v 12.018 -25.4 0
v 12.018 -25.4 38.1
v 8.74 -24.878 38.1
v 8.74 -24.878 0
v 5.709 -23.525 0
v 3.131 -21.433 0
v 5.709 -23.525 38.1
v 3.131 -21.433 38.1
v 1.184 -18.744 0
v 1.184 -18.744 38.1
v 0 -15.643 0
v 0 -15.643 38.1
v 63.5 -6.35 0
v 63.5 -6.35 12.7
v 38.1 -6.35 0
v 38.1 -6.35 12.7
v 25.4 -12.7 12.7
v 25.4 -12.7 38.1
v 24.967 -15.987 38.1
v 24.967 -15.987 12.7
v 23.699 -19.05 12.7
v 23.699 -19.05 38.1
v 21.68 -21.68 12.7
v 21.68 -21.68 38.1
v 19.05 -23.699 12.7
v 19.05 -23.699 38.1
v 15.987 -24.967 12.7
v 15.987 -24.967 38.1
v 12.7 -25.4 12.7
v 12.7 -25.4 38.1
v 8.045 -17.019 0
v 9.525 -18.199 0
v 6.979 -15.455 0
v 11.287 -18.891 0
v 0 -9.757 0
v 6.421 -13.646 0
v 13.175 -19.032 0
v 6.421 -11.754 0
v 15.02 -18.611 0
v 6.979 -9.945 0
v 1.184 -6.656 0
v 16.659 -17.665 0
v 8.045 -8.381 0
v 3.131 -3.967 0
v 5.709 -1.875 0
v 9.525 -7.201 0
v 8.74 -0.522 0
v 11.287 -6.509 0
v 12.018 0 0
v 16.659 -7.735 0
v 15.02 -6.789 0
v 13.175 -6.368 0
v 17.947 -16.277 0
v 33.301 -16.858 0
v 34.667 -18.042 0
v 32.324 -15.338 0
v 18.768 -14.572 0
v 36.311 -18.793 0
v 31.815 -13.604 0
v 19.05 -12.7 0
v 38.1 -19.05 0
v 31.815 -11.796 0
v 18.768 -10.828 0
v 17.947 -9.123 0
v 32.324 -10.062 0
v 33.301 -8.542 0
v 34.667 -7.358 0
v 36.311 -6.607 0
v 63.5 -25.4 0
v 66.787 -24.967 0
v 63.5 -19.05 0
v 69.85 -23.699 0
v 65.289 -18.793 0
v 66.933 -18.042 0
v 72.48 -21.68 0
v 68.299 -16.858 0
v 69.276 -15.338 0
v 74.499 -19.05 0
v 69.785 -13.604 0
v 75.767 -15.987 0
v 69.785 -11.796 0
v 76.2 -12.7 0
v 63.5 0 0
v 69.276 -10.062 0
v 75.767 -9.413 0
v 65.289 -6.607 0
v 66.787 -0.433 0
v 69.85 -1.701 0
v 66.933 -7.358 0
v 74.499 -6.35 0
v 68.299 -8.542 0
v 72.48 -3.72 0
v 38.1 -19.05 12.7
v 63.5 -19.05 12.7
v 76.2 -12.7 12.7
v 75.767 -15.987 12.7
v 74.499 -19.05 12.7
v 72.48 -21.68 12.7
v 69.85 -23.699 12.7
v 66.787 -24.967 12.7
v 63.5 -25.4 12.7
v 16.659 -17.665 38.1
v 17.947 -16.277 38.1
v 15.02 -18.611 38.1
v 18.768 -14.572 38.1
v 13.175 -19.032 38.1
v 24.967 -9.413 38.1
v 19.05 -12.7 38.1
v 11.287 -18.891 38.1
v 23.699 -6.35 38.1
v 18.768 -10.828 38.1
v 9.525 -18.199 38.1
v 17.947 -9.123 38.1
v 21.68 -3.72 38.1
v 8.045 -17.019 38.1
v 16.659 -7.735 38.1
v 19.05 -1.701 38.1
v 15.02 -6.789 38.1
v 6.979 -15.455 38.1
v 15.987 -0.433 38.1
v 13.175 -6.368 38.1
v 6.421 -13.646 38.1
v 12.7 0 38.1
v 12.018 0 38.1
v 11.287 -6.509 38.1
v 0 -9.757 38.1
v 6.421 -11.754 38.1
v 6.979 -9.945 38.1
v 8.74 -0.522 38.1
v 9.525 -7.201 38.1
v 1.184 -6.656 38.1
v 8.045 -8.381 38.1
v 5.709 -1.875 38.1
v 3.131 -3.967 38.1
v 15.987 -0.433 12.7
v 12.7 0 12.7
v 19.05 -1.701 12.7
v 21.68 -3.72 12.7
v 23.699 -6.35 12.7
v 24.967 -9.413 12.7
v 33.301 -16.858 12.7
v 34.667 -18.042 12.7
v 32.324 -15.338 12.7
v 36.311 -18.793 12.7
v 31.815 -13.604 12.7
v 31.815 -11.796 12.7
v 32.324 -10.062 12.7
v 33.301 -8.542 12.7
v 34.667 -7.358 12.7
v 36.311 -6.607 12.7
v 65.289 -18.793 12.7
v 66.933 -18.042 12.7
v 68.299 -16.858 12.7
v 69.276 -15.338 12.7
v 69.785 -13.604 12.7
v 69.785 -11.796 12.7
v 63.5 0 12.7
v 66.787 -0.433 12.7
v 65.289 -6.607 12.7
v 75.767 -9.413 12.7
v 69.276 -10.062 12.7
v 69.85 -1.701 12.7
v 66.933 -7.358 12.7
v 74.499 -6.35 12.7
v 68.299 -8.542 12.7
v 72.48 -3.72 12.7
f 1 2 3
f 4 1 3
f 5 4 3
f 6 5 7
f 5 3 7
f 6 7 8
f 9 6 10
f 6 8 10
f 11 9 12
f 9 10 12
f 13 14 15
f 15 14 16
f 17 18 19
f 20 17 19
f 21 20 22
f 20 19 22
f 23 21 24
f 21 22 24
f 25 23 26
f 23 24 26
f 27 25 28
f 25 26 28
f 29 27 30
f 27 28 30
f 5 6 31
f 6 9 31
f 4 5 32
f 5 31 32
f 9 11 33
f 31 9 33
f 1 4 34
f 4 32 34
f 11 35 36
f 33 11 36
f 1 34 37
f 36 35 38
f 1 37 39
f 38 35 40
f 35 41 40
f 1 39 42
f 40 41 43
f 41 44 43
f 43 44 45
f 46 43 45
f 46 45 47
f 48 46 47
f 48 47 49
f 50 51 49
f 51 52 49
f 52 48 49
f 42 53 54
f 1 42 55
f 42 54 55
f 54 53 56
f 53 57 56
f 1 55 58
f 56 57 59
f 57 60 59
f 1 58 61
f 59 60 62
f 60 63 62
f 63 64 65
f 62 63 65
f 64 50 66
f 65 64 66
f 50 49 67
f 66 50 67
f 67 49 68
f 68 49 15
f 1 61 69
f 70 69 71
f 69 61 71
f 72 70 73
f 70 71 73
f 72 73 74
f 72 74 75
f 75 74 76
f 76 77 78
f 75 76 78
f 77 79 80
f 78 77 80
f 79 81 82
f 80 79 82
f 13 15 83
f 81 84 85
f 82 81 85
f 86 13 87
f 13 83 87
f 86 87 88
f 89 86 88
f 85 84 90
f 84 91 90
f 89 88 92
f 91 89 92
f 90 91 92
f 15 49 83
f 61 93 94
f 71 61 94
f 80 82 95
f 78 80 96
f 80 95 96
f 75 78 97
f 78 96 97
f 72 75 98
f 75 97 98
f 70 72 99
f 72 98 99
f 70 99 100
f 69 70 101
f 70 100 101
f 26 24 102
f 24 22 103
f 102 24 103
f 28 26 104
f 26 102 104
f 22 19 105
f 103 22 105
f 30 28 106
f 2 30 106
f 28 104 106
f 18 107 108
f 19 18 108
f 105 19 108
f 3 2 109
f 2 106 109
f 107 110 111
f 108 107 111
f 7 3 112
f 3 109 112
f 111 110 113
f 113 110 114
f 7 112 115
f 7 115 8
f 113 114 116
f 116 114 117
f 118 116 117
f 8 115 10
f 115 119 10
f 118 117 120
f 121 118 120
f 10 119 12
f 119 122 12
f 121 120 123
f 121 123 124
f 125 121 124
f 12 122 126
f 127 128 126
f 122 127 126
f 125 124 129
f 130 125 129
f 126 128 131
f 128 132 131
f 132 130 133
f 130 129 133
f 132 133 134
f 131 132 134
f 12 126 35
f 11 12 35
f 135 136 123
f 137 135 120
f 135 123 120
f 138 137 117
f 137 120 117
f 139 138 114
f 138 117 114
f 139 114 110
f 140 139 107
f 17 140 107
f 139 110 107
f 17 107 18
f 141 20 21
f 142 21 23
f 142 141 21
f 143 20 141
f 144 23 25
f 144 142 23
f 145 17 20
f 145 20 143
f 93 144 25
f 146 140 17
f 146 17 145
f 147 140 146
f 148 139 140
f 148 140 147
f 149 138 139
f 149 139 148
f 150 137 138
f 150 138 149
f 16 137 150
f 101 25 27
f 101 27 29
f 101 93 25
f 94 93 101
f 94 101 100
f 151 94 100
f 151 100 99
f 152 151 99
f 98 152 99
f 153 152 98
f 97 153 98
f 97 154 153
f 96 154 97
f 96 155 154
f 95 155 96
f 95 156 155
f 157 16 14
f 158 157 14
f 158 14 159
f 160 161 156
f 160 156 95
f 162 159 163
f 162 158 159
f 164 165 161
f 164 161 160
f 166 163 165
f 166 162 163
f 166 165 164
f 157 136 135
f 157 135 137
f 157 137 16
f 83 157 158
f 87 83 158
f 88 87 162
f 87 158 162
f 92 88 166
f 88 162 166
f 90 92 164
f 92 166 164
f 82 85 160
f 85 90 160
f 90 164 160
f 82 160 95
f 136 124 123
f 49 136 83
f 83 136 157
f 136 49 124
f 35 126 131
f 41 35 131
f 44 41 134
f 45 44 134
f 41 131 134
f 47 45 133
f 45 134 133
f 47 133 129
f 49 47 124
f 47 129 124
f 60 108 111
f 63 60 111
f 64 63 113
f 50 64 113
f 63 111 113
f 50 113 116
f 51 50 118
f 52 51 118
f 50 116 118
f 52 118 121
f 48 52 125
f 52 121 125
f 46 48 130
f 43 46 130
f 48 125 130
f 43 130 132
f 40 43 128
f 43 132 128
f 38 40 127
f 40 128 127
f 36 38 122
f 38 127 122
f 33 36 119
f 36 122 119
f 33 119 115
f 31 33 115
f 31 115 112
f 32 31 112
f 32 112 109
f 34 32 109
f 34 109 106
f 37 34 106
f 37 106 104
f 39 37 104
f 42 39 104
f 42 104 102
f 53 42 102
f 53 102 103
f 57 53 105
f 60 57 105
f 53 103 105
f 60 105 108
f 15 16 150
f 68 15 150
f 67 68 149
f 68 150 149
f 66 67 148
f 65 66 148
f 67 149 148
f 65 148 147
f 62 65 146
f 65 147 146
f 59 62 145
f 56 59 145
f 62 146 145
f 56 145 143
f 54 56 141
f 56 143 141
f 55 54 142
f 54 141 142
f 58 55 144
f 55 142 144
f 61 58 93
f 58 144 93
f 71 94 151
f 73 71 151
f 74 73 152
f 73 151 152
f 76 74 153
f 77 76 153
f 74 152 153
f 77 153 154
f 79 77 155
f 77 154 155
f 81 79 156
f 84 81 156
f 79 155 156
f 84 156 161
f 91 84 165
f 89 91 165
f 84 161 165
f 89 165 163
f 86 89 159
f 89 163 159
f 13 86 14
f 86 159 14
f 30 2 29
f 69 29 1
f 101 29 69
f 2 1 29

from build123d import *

# Parameters (mm, degrees)
F1_DEPTH = 25.4
F2_R     = 6.35
F3_DEPTH = 38.1
F5_DEPTH = 25.4
F7_DEPTH = 25.4


with BuildPart() as f1:
    # F0 (on Front) → F1 (new body)
    with BuildSketch(Plane.XZ):
        Polygon((0, 38.1), (0, 0), (76.2, 0), (76.2, 12.7), (25.4, 12.7), (25.4, 38.1), align=None)
    extrude(amount=F1_DEPTH)

    # F2 (on face) → F3 (cut)
    with BuildSketch(Plane.XY.offset(38.1)):
        with BuildLine():
            ThreePointArc((12.0178175899, -25.4), (4.3513987444, -22.5633729526), (0, -15.6434192037))
            Line((0, -15.6434192037), (0, -25.4))
            Line((0, -25.4), (12.0178175899, -25.4))
        make_face()
        with BuildLine():
            ThreePointArc((0, -9.7565807963), (4.3513987444, -2.8366270474), (12.0178175899, 0))
            Line((12.0178175899, 0), (0, 0))
            Line((0, 0), (0, -9.7565807963))
        make_face()
        with Locations((12.7, -12.7)):
            Circle(F2_R)
    extrude(amount=-F3_DEPTH, mode=Mode.SUBTRACT)

    # F4 (on face) → F5 (cut)
    with BuildSketch(Plane.XY.offset(38.1)):
        with BuildLine():
            ThreePointArc((12.7, 0), (21.6802561211, -3.7197438789), (25.4, -12.7))
            Line((25.4, -12.7), (25.4, 0))
            Line((25.4, 0), (12.7, 0))
        make_face()
        with BuildLine():
            ThreePointArc((25.4, -12.7), (21.6802561211, -21.6802561211), (12.7, -25.4))
            Line((12.7, -25.4), (25.4, -25.4))
            Line((25.4, -25.4), (25.4, -12.7))
        make_face()
    extrude(amount=-F5_DEPTH, mode=Mode.SUBTRACT)

    # F6 (on face) → F7 (cut)
    with BuildSketch(Plane.XY.offset(12.7)):
        with BuildLine():
            Line((63.5, -6.35), (38.1, -6.35))
            ThreePointArc((38.1, -6.35), (31.75, -12.7), (38.1, -19.05))
            Line((38.1, -19.05), (63.5, -19.05))
            Line((63.5, -19.05), (63.5, -6.35))
        make_face()
        with BuildLine():
            ThreePointArc((63.5, -19.05), (69.85, -12.7), (63.5, -6.35))
            Line((63.5, -6.35), (63.5, -19.05))
        make_face()
        with BuildLine():
            ThreePointArc((63.5, 0), (72.4802561211, -3.7197438789), (76.2, -12.7))
            Line((76.2, -12.7), (76.2, 0))
            Line((76.2, 0), (63.5, 0))
        make_face()
        with BuildLine():
            ThreePointArc((76.2, -12.7), (72.4802561211, -21.6802561211), (63.5, -25.4))
            Line((63.5, -25.4), (76.2, -25.4))
            Line((76.2, -25.4), (76.2, -12.7))
        make_face()
    extrude(amount=-F7_DEPTH, mode=Mode.SUBTRACT)


solid = f1.part
